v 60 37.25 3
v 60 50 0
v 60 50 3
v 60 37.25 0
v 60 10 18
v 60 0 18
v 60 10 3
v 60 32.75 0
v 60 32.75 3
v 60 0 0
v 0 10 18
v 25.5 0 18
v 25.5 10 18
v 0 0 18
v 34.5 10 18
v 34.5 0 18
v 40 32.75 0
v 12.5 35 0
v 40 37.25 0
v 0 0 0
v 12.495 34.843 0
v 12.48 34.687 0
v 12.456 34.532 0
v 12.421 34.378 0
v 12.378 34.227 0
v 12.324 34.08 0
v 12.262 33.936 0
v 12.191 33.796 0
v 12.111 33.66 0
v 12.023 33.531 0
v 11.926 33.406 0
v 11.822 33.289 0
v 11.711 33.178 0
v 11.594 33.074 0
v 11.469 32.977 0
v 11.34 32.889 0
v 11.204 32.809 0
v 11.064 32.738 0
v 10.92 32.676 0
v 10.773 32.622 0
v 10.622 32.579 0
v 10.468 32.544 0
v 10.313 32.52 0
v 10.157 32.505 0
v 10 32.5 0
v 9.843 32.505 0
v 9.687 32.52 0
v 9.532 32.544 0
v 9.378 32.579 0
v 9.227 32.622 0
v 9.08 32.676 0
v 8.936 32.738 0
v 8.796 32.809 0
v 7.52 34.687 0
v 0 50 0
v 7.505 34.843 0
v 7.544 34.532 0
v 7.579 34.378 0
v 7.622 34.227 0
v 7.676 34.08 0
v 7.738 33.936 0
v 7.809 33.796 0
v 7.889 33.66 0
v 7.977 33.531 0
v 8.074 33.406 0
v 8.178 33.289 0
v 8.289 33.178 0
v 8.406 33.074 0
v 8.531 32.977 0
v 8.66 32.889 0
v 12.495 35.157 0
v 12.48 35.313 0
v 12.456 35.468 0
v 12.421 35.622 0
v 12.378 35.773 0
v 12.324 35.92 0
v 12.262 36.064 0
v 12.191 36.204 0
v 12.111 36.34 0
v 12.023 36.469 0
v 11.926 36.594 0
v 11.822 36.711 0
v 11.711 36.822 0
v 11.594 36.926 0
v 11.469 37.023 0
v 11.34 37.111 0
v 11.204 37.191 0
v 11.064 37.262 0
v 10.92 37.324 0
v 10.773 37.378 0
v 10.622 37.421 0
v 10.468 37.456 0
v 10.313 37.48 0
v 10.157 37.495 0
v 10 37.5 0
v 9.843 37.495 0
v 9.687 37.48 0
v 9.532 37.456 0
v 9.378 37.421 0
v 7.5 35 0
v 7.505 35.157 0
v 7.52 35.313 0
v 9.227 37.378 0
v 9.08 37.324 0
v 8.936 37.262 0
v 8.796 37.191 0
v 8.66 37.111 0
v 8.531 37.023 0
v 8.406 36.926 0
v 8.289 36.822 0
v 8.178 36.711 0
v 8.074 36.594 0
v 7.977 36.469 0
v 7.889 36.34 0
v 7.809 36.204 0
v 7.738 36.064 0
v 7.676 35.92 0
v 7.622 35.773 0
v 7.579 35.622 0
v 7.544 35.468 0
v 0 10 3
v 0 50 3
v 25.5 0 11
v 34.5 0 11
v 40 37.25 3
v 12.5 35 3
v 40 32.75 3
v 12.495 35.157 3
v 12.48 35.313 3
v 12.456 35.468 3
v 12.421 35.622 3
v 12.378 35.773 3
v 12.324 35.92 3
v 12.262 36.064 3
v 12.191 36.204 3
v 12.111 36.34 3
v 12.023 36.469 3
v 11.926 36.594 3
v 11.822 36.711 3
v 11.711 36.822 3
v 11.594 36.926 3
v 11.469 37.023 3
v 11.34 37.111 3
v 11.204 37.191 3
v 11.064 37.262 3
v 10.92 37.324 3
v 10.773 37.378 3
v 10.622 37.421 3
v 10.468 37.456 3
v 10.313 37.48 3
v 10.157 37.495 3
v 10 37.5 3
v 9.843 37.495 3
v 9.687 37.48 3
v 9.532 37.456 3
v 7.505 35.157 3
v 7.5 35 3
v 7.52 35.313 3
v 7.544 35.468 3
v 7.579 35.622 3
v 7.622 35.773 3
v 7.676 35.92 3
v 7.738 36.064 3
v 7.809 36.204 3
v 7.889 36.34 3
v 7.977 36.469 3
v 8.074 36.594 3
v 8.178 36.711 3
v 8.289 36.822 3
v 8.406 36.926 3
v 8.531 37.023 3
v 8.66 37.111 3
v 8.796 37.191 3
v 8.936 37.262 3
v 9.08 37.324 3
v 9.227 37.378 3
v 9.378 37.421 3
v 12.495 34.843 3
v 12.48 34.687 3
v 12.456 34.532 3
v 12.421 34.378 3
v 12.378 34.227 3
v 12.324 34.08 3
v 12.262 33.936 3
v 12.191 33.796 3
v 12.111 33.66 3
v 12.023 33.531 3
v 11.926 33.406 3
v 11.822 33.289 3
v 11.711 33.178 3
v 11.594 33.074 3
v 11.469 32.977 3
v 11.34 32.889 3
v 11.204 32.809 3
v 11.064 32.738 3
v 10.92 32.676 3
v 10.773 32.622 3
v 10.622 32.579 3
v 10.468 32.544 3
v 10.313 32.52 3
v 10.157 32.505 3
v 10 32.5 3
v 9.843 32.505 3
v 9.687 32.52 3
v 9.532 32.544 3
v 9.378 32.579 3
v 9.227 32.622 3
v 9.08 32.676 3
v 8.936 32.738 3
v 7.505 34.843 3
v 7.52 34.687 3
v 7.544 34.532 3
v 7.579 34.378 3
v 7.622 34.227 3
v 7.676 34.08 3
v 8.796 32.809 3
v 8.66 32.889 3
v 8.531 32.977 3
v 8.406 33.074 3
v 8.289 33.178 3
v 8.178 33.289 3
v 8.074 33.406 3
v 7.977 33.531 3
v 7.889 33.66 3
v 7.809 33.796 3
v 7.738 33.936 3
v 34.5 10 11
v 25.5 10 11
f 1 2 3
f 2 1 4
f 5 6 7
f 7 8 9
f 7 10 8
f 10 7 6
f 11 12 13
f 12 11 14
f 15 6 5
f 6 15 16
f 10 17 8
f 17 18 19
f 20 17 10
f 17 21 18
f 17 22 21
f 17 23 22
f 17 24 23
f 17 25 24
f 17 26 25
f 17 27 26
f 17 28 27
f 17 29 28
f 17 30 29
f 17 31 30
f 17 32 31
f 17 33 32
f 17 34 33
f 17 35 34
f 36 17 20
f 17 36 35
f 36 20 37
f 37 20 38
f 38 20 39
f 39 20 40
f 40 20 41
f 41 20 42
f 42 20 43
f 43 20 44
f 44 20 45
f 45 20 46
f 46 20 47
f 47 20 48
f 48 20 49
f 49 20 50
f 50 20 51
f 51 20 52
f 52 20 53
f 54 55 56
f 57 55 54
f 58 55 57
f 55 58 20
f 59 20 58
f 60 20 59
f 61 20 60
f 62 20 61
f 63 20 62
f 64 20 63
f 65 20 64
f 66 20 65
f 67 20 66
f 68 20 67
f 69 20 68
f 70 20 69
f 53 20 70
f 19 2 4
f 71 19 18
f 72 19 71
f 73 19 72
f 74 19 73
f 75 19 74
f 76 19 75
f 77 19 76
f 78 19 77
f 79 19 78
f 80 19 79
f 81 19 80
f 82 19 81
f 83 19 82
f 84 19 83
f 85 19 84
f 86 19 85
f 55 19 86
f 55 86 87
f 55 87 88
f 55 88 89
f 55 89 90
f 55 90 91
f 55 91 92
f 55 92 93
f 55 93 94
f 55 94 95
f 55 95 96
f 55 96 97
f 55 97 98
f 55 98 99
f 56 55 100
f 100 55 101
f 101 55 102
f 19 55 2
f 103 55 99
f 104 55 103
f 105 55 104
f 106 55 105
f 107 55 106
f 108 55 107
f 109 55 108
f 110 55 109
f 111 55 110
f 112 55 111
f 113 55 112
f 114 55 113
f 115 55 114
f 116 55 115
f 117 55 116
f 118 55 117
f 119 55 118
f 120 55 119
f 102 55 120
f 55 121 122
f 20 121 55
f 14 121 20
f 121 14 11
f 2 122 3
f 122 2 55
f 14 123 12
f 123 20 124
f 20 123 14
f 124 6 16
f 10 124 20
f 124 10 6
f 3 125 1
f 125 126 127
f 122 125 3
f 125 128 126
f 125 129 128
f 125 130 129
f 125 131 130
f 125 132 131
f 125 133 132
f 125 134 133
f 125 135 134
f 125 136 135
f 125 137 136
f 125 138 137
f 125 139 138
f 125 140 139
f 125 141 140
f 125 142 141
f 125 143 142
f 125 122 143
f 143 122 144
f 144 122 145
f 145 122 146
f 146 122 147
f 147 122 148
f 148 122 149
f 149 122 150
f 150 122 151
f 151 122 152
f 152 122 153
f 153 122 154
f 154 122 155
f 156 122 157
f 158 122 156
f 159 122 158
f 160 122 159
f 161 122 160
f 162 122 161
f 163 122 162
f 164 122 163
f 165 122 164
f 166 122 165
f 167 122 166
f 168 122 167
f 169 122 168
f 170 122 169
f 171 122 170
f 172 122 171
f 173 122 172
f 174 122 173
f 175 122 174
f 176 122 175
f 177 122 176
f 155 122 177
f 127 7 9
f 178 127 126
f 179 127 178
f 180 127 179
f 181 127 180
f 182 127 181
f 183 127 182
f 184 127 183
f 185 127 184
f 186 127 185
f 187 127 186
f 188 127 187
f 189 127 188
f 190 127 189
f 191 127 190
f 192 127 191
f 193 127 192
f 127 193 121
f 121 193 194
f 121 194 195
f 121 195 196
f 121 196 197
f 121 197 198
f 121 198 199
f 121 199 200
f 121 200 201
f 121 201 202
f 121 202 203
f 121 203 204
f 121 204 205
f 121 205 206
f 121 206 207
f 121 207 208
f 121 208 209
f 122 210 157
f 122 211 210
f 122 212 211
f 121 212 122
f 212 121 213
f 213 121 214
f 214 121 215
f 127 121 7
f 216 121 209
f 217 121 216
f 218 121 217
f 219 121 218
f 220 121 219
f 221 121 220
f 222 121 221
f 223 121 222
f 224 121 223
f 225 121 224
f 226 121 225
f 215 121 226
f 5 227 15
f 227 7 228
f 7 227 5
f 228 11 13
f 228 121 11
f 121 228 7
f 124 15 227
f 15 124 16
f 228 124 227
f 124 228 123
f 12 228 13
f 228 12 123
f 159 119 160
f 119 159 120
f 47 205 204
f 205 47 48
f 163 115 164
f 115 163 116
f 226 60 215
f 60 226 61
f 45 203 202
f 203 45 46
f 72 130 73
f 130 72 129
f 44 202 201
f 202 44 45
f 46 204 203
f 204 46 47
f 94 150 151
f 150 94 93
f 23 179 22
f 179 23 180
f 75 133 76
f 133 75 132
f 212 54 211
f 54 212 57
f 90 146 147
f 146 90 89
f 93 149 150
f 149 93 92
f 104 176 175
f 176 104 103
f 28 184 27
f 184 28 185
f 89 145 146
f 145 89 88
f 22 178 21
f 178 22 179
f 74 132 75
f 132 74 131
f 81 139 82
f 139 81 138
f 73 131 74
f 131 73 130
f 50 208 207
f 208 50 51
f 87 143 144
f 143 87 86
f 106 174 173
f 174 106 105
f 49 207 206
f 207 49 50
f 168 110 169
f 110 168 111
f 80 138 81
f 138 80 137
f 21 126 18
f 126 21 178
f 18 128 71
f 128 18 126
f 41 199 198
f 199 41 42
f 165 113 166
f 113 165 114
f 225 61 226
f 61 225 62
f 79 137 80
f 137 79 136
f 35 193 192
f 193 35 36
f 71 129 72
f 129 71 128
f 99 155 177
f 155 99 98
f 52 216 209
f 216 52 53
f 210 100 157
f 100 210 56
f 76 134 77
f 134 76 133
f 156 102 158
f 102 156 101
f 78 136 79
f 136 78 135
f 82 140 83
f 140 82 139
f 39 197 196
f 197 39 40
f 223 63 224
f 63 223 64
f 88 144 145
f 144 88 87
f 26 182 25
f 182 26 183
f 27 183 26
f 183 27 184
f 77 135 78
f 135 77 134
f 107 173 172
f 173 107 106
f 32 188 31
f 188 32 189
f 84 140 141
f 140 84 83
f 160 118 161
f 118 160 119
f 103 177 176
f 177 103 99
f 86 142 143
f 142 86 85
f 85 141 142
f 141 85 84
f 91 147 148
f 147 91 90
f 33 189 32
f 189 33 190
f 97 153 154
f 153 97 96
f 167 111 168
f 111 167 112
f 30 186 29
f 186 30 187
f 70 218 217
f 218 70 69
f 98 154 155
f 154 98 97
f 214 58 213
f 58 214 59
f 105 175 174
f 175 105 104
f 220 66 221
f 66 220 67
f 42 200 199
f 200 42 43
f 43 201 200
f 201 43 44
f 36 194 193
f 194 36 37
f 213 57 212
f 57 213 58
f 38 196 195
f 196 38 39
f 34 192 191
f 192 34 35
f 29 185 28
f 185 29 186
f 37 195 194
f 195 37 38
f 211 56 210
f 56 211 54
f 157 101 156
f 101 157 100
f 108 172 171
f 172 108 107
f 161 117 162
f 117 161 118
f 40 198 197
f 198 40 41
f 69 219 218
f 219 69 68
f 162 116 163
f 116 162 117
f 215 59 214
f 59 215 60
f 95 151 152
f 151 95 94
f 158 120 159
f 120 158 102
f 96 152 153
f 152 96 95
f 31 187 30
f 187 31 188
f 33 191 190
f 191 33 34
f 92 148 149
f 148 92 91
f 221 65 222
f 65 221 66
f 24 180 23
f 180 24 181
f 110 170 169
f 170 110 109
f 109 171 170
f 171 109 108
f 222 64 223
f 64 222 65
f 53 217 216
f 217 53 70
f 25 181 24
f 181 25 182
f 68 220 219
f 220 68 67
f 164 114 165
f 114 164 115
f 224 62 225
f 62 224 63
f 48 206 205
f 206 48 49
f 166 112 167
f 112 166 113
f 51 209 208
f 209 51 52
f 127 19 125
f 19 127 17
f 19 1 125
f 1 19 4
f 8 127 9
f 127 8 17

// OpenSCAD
$fn=100;

//        translate([0,0,0])

difference()
{
    cube([60,50,18]);
    translate([-0.001,10,3])
        cube([60.002,40.001,15.001]);
    translate([25.5,-0.001,11])
        cube([9,10.002,7.001]);
    translate([10,35,-0.001])
        cylinder(d=5,h=3.002);
    translate([40,32.75,-0.001])
        cube([20.001,4.5,3.002]);    
}
